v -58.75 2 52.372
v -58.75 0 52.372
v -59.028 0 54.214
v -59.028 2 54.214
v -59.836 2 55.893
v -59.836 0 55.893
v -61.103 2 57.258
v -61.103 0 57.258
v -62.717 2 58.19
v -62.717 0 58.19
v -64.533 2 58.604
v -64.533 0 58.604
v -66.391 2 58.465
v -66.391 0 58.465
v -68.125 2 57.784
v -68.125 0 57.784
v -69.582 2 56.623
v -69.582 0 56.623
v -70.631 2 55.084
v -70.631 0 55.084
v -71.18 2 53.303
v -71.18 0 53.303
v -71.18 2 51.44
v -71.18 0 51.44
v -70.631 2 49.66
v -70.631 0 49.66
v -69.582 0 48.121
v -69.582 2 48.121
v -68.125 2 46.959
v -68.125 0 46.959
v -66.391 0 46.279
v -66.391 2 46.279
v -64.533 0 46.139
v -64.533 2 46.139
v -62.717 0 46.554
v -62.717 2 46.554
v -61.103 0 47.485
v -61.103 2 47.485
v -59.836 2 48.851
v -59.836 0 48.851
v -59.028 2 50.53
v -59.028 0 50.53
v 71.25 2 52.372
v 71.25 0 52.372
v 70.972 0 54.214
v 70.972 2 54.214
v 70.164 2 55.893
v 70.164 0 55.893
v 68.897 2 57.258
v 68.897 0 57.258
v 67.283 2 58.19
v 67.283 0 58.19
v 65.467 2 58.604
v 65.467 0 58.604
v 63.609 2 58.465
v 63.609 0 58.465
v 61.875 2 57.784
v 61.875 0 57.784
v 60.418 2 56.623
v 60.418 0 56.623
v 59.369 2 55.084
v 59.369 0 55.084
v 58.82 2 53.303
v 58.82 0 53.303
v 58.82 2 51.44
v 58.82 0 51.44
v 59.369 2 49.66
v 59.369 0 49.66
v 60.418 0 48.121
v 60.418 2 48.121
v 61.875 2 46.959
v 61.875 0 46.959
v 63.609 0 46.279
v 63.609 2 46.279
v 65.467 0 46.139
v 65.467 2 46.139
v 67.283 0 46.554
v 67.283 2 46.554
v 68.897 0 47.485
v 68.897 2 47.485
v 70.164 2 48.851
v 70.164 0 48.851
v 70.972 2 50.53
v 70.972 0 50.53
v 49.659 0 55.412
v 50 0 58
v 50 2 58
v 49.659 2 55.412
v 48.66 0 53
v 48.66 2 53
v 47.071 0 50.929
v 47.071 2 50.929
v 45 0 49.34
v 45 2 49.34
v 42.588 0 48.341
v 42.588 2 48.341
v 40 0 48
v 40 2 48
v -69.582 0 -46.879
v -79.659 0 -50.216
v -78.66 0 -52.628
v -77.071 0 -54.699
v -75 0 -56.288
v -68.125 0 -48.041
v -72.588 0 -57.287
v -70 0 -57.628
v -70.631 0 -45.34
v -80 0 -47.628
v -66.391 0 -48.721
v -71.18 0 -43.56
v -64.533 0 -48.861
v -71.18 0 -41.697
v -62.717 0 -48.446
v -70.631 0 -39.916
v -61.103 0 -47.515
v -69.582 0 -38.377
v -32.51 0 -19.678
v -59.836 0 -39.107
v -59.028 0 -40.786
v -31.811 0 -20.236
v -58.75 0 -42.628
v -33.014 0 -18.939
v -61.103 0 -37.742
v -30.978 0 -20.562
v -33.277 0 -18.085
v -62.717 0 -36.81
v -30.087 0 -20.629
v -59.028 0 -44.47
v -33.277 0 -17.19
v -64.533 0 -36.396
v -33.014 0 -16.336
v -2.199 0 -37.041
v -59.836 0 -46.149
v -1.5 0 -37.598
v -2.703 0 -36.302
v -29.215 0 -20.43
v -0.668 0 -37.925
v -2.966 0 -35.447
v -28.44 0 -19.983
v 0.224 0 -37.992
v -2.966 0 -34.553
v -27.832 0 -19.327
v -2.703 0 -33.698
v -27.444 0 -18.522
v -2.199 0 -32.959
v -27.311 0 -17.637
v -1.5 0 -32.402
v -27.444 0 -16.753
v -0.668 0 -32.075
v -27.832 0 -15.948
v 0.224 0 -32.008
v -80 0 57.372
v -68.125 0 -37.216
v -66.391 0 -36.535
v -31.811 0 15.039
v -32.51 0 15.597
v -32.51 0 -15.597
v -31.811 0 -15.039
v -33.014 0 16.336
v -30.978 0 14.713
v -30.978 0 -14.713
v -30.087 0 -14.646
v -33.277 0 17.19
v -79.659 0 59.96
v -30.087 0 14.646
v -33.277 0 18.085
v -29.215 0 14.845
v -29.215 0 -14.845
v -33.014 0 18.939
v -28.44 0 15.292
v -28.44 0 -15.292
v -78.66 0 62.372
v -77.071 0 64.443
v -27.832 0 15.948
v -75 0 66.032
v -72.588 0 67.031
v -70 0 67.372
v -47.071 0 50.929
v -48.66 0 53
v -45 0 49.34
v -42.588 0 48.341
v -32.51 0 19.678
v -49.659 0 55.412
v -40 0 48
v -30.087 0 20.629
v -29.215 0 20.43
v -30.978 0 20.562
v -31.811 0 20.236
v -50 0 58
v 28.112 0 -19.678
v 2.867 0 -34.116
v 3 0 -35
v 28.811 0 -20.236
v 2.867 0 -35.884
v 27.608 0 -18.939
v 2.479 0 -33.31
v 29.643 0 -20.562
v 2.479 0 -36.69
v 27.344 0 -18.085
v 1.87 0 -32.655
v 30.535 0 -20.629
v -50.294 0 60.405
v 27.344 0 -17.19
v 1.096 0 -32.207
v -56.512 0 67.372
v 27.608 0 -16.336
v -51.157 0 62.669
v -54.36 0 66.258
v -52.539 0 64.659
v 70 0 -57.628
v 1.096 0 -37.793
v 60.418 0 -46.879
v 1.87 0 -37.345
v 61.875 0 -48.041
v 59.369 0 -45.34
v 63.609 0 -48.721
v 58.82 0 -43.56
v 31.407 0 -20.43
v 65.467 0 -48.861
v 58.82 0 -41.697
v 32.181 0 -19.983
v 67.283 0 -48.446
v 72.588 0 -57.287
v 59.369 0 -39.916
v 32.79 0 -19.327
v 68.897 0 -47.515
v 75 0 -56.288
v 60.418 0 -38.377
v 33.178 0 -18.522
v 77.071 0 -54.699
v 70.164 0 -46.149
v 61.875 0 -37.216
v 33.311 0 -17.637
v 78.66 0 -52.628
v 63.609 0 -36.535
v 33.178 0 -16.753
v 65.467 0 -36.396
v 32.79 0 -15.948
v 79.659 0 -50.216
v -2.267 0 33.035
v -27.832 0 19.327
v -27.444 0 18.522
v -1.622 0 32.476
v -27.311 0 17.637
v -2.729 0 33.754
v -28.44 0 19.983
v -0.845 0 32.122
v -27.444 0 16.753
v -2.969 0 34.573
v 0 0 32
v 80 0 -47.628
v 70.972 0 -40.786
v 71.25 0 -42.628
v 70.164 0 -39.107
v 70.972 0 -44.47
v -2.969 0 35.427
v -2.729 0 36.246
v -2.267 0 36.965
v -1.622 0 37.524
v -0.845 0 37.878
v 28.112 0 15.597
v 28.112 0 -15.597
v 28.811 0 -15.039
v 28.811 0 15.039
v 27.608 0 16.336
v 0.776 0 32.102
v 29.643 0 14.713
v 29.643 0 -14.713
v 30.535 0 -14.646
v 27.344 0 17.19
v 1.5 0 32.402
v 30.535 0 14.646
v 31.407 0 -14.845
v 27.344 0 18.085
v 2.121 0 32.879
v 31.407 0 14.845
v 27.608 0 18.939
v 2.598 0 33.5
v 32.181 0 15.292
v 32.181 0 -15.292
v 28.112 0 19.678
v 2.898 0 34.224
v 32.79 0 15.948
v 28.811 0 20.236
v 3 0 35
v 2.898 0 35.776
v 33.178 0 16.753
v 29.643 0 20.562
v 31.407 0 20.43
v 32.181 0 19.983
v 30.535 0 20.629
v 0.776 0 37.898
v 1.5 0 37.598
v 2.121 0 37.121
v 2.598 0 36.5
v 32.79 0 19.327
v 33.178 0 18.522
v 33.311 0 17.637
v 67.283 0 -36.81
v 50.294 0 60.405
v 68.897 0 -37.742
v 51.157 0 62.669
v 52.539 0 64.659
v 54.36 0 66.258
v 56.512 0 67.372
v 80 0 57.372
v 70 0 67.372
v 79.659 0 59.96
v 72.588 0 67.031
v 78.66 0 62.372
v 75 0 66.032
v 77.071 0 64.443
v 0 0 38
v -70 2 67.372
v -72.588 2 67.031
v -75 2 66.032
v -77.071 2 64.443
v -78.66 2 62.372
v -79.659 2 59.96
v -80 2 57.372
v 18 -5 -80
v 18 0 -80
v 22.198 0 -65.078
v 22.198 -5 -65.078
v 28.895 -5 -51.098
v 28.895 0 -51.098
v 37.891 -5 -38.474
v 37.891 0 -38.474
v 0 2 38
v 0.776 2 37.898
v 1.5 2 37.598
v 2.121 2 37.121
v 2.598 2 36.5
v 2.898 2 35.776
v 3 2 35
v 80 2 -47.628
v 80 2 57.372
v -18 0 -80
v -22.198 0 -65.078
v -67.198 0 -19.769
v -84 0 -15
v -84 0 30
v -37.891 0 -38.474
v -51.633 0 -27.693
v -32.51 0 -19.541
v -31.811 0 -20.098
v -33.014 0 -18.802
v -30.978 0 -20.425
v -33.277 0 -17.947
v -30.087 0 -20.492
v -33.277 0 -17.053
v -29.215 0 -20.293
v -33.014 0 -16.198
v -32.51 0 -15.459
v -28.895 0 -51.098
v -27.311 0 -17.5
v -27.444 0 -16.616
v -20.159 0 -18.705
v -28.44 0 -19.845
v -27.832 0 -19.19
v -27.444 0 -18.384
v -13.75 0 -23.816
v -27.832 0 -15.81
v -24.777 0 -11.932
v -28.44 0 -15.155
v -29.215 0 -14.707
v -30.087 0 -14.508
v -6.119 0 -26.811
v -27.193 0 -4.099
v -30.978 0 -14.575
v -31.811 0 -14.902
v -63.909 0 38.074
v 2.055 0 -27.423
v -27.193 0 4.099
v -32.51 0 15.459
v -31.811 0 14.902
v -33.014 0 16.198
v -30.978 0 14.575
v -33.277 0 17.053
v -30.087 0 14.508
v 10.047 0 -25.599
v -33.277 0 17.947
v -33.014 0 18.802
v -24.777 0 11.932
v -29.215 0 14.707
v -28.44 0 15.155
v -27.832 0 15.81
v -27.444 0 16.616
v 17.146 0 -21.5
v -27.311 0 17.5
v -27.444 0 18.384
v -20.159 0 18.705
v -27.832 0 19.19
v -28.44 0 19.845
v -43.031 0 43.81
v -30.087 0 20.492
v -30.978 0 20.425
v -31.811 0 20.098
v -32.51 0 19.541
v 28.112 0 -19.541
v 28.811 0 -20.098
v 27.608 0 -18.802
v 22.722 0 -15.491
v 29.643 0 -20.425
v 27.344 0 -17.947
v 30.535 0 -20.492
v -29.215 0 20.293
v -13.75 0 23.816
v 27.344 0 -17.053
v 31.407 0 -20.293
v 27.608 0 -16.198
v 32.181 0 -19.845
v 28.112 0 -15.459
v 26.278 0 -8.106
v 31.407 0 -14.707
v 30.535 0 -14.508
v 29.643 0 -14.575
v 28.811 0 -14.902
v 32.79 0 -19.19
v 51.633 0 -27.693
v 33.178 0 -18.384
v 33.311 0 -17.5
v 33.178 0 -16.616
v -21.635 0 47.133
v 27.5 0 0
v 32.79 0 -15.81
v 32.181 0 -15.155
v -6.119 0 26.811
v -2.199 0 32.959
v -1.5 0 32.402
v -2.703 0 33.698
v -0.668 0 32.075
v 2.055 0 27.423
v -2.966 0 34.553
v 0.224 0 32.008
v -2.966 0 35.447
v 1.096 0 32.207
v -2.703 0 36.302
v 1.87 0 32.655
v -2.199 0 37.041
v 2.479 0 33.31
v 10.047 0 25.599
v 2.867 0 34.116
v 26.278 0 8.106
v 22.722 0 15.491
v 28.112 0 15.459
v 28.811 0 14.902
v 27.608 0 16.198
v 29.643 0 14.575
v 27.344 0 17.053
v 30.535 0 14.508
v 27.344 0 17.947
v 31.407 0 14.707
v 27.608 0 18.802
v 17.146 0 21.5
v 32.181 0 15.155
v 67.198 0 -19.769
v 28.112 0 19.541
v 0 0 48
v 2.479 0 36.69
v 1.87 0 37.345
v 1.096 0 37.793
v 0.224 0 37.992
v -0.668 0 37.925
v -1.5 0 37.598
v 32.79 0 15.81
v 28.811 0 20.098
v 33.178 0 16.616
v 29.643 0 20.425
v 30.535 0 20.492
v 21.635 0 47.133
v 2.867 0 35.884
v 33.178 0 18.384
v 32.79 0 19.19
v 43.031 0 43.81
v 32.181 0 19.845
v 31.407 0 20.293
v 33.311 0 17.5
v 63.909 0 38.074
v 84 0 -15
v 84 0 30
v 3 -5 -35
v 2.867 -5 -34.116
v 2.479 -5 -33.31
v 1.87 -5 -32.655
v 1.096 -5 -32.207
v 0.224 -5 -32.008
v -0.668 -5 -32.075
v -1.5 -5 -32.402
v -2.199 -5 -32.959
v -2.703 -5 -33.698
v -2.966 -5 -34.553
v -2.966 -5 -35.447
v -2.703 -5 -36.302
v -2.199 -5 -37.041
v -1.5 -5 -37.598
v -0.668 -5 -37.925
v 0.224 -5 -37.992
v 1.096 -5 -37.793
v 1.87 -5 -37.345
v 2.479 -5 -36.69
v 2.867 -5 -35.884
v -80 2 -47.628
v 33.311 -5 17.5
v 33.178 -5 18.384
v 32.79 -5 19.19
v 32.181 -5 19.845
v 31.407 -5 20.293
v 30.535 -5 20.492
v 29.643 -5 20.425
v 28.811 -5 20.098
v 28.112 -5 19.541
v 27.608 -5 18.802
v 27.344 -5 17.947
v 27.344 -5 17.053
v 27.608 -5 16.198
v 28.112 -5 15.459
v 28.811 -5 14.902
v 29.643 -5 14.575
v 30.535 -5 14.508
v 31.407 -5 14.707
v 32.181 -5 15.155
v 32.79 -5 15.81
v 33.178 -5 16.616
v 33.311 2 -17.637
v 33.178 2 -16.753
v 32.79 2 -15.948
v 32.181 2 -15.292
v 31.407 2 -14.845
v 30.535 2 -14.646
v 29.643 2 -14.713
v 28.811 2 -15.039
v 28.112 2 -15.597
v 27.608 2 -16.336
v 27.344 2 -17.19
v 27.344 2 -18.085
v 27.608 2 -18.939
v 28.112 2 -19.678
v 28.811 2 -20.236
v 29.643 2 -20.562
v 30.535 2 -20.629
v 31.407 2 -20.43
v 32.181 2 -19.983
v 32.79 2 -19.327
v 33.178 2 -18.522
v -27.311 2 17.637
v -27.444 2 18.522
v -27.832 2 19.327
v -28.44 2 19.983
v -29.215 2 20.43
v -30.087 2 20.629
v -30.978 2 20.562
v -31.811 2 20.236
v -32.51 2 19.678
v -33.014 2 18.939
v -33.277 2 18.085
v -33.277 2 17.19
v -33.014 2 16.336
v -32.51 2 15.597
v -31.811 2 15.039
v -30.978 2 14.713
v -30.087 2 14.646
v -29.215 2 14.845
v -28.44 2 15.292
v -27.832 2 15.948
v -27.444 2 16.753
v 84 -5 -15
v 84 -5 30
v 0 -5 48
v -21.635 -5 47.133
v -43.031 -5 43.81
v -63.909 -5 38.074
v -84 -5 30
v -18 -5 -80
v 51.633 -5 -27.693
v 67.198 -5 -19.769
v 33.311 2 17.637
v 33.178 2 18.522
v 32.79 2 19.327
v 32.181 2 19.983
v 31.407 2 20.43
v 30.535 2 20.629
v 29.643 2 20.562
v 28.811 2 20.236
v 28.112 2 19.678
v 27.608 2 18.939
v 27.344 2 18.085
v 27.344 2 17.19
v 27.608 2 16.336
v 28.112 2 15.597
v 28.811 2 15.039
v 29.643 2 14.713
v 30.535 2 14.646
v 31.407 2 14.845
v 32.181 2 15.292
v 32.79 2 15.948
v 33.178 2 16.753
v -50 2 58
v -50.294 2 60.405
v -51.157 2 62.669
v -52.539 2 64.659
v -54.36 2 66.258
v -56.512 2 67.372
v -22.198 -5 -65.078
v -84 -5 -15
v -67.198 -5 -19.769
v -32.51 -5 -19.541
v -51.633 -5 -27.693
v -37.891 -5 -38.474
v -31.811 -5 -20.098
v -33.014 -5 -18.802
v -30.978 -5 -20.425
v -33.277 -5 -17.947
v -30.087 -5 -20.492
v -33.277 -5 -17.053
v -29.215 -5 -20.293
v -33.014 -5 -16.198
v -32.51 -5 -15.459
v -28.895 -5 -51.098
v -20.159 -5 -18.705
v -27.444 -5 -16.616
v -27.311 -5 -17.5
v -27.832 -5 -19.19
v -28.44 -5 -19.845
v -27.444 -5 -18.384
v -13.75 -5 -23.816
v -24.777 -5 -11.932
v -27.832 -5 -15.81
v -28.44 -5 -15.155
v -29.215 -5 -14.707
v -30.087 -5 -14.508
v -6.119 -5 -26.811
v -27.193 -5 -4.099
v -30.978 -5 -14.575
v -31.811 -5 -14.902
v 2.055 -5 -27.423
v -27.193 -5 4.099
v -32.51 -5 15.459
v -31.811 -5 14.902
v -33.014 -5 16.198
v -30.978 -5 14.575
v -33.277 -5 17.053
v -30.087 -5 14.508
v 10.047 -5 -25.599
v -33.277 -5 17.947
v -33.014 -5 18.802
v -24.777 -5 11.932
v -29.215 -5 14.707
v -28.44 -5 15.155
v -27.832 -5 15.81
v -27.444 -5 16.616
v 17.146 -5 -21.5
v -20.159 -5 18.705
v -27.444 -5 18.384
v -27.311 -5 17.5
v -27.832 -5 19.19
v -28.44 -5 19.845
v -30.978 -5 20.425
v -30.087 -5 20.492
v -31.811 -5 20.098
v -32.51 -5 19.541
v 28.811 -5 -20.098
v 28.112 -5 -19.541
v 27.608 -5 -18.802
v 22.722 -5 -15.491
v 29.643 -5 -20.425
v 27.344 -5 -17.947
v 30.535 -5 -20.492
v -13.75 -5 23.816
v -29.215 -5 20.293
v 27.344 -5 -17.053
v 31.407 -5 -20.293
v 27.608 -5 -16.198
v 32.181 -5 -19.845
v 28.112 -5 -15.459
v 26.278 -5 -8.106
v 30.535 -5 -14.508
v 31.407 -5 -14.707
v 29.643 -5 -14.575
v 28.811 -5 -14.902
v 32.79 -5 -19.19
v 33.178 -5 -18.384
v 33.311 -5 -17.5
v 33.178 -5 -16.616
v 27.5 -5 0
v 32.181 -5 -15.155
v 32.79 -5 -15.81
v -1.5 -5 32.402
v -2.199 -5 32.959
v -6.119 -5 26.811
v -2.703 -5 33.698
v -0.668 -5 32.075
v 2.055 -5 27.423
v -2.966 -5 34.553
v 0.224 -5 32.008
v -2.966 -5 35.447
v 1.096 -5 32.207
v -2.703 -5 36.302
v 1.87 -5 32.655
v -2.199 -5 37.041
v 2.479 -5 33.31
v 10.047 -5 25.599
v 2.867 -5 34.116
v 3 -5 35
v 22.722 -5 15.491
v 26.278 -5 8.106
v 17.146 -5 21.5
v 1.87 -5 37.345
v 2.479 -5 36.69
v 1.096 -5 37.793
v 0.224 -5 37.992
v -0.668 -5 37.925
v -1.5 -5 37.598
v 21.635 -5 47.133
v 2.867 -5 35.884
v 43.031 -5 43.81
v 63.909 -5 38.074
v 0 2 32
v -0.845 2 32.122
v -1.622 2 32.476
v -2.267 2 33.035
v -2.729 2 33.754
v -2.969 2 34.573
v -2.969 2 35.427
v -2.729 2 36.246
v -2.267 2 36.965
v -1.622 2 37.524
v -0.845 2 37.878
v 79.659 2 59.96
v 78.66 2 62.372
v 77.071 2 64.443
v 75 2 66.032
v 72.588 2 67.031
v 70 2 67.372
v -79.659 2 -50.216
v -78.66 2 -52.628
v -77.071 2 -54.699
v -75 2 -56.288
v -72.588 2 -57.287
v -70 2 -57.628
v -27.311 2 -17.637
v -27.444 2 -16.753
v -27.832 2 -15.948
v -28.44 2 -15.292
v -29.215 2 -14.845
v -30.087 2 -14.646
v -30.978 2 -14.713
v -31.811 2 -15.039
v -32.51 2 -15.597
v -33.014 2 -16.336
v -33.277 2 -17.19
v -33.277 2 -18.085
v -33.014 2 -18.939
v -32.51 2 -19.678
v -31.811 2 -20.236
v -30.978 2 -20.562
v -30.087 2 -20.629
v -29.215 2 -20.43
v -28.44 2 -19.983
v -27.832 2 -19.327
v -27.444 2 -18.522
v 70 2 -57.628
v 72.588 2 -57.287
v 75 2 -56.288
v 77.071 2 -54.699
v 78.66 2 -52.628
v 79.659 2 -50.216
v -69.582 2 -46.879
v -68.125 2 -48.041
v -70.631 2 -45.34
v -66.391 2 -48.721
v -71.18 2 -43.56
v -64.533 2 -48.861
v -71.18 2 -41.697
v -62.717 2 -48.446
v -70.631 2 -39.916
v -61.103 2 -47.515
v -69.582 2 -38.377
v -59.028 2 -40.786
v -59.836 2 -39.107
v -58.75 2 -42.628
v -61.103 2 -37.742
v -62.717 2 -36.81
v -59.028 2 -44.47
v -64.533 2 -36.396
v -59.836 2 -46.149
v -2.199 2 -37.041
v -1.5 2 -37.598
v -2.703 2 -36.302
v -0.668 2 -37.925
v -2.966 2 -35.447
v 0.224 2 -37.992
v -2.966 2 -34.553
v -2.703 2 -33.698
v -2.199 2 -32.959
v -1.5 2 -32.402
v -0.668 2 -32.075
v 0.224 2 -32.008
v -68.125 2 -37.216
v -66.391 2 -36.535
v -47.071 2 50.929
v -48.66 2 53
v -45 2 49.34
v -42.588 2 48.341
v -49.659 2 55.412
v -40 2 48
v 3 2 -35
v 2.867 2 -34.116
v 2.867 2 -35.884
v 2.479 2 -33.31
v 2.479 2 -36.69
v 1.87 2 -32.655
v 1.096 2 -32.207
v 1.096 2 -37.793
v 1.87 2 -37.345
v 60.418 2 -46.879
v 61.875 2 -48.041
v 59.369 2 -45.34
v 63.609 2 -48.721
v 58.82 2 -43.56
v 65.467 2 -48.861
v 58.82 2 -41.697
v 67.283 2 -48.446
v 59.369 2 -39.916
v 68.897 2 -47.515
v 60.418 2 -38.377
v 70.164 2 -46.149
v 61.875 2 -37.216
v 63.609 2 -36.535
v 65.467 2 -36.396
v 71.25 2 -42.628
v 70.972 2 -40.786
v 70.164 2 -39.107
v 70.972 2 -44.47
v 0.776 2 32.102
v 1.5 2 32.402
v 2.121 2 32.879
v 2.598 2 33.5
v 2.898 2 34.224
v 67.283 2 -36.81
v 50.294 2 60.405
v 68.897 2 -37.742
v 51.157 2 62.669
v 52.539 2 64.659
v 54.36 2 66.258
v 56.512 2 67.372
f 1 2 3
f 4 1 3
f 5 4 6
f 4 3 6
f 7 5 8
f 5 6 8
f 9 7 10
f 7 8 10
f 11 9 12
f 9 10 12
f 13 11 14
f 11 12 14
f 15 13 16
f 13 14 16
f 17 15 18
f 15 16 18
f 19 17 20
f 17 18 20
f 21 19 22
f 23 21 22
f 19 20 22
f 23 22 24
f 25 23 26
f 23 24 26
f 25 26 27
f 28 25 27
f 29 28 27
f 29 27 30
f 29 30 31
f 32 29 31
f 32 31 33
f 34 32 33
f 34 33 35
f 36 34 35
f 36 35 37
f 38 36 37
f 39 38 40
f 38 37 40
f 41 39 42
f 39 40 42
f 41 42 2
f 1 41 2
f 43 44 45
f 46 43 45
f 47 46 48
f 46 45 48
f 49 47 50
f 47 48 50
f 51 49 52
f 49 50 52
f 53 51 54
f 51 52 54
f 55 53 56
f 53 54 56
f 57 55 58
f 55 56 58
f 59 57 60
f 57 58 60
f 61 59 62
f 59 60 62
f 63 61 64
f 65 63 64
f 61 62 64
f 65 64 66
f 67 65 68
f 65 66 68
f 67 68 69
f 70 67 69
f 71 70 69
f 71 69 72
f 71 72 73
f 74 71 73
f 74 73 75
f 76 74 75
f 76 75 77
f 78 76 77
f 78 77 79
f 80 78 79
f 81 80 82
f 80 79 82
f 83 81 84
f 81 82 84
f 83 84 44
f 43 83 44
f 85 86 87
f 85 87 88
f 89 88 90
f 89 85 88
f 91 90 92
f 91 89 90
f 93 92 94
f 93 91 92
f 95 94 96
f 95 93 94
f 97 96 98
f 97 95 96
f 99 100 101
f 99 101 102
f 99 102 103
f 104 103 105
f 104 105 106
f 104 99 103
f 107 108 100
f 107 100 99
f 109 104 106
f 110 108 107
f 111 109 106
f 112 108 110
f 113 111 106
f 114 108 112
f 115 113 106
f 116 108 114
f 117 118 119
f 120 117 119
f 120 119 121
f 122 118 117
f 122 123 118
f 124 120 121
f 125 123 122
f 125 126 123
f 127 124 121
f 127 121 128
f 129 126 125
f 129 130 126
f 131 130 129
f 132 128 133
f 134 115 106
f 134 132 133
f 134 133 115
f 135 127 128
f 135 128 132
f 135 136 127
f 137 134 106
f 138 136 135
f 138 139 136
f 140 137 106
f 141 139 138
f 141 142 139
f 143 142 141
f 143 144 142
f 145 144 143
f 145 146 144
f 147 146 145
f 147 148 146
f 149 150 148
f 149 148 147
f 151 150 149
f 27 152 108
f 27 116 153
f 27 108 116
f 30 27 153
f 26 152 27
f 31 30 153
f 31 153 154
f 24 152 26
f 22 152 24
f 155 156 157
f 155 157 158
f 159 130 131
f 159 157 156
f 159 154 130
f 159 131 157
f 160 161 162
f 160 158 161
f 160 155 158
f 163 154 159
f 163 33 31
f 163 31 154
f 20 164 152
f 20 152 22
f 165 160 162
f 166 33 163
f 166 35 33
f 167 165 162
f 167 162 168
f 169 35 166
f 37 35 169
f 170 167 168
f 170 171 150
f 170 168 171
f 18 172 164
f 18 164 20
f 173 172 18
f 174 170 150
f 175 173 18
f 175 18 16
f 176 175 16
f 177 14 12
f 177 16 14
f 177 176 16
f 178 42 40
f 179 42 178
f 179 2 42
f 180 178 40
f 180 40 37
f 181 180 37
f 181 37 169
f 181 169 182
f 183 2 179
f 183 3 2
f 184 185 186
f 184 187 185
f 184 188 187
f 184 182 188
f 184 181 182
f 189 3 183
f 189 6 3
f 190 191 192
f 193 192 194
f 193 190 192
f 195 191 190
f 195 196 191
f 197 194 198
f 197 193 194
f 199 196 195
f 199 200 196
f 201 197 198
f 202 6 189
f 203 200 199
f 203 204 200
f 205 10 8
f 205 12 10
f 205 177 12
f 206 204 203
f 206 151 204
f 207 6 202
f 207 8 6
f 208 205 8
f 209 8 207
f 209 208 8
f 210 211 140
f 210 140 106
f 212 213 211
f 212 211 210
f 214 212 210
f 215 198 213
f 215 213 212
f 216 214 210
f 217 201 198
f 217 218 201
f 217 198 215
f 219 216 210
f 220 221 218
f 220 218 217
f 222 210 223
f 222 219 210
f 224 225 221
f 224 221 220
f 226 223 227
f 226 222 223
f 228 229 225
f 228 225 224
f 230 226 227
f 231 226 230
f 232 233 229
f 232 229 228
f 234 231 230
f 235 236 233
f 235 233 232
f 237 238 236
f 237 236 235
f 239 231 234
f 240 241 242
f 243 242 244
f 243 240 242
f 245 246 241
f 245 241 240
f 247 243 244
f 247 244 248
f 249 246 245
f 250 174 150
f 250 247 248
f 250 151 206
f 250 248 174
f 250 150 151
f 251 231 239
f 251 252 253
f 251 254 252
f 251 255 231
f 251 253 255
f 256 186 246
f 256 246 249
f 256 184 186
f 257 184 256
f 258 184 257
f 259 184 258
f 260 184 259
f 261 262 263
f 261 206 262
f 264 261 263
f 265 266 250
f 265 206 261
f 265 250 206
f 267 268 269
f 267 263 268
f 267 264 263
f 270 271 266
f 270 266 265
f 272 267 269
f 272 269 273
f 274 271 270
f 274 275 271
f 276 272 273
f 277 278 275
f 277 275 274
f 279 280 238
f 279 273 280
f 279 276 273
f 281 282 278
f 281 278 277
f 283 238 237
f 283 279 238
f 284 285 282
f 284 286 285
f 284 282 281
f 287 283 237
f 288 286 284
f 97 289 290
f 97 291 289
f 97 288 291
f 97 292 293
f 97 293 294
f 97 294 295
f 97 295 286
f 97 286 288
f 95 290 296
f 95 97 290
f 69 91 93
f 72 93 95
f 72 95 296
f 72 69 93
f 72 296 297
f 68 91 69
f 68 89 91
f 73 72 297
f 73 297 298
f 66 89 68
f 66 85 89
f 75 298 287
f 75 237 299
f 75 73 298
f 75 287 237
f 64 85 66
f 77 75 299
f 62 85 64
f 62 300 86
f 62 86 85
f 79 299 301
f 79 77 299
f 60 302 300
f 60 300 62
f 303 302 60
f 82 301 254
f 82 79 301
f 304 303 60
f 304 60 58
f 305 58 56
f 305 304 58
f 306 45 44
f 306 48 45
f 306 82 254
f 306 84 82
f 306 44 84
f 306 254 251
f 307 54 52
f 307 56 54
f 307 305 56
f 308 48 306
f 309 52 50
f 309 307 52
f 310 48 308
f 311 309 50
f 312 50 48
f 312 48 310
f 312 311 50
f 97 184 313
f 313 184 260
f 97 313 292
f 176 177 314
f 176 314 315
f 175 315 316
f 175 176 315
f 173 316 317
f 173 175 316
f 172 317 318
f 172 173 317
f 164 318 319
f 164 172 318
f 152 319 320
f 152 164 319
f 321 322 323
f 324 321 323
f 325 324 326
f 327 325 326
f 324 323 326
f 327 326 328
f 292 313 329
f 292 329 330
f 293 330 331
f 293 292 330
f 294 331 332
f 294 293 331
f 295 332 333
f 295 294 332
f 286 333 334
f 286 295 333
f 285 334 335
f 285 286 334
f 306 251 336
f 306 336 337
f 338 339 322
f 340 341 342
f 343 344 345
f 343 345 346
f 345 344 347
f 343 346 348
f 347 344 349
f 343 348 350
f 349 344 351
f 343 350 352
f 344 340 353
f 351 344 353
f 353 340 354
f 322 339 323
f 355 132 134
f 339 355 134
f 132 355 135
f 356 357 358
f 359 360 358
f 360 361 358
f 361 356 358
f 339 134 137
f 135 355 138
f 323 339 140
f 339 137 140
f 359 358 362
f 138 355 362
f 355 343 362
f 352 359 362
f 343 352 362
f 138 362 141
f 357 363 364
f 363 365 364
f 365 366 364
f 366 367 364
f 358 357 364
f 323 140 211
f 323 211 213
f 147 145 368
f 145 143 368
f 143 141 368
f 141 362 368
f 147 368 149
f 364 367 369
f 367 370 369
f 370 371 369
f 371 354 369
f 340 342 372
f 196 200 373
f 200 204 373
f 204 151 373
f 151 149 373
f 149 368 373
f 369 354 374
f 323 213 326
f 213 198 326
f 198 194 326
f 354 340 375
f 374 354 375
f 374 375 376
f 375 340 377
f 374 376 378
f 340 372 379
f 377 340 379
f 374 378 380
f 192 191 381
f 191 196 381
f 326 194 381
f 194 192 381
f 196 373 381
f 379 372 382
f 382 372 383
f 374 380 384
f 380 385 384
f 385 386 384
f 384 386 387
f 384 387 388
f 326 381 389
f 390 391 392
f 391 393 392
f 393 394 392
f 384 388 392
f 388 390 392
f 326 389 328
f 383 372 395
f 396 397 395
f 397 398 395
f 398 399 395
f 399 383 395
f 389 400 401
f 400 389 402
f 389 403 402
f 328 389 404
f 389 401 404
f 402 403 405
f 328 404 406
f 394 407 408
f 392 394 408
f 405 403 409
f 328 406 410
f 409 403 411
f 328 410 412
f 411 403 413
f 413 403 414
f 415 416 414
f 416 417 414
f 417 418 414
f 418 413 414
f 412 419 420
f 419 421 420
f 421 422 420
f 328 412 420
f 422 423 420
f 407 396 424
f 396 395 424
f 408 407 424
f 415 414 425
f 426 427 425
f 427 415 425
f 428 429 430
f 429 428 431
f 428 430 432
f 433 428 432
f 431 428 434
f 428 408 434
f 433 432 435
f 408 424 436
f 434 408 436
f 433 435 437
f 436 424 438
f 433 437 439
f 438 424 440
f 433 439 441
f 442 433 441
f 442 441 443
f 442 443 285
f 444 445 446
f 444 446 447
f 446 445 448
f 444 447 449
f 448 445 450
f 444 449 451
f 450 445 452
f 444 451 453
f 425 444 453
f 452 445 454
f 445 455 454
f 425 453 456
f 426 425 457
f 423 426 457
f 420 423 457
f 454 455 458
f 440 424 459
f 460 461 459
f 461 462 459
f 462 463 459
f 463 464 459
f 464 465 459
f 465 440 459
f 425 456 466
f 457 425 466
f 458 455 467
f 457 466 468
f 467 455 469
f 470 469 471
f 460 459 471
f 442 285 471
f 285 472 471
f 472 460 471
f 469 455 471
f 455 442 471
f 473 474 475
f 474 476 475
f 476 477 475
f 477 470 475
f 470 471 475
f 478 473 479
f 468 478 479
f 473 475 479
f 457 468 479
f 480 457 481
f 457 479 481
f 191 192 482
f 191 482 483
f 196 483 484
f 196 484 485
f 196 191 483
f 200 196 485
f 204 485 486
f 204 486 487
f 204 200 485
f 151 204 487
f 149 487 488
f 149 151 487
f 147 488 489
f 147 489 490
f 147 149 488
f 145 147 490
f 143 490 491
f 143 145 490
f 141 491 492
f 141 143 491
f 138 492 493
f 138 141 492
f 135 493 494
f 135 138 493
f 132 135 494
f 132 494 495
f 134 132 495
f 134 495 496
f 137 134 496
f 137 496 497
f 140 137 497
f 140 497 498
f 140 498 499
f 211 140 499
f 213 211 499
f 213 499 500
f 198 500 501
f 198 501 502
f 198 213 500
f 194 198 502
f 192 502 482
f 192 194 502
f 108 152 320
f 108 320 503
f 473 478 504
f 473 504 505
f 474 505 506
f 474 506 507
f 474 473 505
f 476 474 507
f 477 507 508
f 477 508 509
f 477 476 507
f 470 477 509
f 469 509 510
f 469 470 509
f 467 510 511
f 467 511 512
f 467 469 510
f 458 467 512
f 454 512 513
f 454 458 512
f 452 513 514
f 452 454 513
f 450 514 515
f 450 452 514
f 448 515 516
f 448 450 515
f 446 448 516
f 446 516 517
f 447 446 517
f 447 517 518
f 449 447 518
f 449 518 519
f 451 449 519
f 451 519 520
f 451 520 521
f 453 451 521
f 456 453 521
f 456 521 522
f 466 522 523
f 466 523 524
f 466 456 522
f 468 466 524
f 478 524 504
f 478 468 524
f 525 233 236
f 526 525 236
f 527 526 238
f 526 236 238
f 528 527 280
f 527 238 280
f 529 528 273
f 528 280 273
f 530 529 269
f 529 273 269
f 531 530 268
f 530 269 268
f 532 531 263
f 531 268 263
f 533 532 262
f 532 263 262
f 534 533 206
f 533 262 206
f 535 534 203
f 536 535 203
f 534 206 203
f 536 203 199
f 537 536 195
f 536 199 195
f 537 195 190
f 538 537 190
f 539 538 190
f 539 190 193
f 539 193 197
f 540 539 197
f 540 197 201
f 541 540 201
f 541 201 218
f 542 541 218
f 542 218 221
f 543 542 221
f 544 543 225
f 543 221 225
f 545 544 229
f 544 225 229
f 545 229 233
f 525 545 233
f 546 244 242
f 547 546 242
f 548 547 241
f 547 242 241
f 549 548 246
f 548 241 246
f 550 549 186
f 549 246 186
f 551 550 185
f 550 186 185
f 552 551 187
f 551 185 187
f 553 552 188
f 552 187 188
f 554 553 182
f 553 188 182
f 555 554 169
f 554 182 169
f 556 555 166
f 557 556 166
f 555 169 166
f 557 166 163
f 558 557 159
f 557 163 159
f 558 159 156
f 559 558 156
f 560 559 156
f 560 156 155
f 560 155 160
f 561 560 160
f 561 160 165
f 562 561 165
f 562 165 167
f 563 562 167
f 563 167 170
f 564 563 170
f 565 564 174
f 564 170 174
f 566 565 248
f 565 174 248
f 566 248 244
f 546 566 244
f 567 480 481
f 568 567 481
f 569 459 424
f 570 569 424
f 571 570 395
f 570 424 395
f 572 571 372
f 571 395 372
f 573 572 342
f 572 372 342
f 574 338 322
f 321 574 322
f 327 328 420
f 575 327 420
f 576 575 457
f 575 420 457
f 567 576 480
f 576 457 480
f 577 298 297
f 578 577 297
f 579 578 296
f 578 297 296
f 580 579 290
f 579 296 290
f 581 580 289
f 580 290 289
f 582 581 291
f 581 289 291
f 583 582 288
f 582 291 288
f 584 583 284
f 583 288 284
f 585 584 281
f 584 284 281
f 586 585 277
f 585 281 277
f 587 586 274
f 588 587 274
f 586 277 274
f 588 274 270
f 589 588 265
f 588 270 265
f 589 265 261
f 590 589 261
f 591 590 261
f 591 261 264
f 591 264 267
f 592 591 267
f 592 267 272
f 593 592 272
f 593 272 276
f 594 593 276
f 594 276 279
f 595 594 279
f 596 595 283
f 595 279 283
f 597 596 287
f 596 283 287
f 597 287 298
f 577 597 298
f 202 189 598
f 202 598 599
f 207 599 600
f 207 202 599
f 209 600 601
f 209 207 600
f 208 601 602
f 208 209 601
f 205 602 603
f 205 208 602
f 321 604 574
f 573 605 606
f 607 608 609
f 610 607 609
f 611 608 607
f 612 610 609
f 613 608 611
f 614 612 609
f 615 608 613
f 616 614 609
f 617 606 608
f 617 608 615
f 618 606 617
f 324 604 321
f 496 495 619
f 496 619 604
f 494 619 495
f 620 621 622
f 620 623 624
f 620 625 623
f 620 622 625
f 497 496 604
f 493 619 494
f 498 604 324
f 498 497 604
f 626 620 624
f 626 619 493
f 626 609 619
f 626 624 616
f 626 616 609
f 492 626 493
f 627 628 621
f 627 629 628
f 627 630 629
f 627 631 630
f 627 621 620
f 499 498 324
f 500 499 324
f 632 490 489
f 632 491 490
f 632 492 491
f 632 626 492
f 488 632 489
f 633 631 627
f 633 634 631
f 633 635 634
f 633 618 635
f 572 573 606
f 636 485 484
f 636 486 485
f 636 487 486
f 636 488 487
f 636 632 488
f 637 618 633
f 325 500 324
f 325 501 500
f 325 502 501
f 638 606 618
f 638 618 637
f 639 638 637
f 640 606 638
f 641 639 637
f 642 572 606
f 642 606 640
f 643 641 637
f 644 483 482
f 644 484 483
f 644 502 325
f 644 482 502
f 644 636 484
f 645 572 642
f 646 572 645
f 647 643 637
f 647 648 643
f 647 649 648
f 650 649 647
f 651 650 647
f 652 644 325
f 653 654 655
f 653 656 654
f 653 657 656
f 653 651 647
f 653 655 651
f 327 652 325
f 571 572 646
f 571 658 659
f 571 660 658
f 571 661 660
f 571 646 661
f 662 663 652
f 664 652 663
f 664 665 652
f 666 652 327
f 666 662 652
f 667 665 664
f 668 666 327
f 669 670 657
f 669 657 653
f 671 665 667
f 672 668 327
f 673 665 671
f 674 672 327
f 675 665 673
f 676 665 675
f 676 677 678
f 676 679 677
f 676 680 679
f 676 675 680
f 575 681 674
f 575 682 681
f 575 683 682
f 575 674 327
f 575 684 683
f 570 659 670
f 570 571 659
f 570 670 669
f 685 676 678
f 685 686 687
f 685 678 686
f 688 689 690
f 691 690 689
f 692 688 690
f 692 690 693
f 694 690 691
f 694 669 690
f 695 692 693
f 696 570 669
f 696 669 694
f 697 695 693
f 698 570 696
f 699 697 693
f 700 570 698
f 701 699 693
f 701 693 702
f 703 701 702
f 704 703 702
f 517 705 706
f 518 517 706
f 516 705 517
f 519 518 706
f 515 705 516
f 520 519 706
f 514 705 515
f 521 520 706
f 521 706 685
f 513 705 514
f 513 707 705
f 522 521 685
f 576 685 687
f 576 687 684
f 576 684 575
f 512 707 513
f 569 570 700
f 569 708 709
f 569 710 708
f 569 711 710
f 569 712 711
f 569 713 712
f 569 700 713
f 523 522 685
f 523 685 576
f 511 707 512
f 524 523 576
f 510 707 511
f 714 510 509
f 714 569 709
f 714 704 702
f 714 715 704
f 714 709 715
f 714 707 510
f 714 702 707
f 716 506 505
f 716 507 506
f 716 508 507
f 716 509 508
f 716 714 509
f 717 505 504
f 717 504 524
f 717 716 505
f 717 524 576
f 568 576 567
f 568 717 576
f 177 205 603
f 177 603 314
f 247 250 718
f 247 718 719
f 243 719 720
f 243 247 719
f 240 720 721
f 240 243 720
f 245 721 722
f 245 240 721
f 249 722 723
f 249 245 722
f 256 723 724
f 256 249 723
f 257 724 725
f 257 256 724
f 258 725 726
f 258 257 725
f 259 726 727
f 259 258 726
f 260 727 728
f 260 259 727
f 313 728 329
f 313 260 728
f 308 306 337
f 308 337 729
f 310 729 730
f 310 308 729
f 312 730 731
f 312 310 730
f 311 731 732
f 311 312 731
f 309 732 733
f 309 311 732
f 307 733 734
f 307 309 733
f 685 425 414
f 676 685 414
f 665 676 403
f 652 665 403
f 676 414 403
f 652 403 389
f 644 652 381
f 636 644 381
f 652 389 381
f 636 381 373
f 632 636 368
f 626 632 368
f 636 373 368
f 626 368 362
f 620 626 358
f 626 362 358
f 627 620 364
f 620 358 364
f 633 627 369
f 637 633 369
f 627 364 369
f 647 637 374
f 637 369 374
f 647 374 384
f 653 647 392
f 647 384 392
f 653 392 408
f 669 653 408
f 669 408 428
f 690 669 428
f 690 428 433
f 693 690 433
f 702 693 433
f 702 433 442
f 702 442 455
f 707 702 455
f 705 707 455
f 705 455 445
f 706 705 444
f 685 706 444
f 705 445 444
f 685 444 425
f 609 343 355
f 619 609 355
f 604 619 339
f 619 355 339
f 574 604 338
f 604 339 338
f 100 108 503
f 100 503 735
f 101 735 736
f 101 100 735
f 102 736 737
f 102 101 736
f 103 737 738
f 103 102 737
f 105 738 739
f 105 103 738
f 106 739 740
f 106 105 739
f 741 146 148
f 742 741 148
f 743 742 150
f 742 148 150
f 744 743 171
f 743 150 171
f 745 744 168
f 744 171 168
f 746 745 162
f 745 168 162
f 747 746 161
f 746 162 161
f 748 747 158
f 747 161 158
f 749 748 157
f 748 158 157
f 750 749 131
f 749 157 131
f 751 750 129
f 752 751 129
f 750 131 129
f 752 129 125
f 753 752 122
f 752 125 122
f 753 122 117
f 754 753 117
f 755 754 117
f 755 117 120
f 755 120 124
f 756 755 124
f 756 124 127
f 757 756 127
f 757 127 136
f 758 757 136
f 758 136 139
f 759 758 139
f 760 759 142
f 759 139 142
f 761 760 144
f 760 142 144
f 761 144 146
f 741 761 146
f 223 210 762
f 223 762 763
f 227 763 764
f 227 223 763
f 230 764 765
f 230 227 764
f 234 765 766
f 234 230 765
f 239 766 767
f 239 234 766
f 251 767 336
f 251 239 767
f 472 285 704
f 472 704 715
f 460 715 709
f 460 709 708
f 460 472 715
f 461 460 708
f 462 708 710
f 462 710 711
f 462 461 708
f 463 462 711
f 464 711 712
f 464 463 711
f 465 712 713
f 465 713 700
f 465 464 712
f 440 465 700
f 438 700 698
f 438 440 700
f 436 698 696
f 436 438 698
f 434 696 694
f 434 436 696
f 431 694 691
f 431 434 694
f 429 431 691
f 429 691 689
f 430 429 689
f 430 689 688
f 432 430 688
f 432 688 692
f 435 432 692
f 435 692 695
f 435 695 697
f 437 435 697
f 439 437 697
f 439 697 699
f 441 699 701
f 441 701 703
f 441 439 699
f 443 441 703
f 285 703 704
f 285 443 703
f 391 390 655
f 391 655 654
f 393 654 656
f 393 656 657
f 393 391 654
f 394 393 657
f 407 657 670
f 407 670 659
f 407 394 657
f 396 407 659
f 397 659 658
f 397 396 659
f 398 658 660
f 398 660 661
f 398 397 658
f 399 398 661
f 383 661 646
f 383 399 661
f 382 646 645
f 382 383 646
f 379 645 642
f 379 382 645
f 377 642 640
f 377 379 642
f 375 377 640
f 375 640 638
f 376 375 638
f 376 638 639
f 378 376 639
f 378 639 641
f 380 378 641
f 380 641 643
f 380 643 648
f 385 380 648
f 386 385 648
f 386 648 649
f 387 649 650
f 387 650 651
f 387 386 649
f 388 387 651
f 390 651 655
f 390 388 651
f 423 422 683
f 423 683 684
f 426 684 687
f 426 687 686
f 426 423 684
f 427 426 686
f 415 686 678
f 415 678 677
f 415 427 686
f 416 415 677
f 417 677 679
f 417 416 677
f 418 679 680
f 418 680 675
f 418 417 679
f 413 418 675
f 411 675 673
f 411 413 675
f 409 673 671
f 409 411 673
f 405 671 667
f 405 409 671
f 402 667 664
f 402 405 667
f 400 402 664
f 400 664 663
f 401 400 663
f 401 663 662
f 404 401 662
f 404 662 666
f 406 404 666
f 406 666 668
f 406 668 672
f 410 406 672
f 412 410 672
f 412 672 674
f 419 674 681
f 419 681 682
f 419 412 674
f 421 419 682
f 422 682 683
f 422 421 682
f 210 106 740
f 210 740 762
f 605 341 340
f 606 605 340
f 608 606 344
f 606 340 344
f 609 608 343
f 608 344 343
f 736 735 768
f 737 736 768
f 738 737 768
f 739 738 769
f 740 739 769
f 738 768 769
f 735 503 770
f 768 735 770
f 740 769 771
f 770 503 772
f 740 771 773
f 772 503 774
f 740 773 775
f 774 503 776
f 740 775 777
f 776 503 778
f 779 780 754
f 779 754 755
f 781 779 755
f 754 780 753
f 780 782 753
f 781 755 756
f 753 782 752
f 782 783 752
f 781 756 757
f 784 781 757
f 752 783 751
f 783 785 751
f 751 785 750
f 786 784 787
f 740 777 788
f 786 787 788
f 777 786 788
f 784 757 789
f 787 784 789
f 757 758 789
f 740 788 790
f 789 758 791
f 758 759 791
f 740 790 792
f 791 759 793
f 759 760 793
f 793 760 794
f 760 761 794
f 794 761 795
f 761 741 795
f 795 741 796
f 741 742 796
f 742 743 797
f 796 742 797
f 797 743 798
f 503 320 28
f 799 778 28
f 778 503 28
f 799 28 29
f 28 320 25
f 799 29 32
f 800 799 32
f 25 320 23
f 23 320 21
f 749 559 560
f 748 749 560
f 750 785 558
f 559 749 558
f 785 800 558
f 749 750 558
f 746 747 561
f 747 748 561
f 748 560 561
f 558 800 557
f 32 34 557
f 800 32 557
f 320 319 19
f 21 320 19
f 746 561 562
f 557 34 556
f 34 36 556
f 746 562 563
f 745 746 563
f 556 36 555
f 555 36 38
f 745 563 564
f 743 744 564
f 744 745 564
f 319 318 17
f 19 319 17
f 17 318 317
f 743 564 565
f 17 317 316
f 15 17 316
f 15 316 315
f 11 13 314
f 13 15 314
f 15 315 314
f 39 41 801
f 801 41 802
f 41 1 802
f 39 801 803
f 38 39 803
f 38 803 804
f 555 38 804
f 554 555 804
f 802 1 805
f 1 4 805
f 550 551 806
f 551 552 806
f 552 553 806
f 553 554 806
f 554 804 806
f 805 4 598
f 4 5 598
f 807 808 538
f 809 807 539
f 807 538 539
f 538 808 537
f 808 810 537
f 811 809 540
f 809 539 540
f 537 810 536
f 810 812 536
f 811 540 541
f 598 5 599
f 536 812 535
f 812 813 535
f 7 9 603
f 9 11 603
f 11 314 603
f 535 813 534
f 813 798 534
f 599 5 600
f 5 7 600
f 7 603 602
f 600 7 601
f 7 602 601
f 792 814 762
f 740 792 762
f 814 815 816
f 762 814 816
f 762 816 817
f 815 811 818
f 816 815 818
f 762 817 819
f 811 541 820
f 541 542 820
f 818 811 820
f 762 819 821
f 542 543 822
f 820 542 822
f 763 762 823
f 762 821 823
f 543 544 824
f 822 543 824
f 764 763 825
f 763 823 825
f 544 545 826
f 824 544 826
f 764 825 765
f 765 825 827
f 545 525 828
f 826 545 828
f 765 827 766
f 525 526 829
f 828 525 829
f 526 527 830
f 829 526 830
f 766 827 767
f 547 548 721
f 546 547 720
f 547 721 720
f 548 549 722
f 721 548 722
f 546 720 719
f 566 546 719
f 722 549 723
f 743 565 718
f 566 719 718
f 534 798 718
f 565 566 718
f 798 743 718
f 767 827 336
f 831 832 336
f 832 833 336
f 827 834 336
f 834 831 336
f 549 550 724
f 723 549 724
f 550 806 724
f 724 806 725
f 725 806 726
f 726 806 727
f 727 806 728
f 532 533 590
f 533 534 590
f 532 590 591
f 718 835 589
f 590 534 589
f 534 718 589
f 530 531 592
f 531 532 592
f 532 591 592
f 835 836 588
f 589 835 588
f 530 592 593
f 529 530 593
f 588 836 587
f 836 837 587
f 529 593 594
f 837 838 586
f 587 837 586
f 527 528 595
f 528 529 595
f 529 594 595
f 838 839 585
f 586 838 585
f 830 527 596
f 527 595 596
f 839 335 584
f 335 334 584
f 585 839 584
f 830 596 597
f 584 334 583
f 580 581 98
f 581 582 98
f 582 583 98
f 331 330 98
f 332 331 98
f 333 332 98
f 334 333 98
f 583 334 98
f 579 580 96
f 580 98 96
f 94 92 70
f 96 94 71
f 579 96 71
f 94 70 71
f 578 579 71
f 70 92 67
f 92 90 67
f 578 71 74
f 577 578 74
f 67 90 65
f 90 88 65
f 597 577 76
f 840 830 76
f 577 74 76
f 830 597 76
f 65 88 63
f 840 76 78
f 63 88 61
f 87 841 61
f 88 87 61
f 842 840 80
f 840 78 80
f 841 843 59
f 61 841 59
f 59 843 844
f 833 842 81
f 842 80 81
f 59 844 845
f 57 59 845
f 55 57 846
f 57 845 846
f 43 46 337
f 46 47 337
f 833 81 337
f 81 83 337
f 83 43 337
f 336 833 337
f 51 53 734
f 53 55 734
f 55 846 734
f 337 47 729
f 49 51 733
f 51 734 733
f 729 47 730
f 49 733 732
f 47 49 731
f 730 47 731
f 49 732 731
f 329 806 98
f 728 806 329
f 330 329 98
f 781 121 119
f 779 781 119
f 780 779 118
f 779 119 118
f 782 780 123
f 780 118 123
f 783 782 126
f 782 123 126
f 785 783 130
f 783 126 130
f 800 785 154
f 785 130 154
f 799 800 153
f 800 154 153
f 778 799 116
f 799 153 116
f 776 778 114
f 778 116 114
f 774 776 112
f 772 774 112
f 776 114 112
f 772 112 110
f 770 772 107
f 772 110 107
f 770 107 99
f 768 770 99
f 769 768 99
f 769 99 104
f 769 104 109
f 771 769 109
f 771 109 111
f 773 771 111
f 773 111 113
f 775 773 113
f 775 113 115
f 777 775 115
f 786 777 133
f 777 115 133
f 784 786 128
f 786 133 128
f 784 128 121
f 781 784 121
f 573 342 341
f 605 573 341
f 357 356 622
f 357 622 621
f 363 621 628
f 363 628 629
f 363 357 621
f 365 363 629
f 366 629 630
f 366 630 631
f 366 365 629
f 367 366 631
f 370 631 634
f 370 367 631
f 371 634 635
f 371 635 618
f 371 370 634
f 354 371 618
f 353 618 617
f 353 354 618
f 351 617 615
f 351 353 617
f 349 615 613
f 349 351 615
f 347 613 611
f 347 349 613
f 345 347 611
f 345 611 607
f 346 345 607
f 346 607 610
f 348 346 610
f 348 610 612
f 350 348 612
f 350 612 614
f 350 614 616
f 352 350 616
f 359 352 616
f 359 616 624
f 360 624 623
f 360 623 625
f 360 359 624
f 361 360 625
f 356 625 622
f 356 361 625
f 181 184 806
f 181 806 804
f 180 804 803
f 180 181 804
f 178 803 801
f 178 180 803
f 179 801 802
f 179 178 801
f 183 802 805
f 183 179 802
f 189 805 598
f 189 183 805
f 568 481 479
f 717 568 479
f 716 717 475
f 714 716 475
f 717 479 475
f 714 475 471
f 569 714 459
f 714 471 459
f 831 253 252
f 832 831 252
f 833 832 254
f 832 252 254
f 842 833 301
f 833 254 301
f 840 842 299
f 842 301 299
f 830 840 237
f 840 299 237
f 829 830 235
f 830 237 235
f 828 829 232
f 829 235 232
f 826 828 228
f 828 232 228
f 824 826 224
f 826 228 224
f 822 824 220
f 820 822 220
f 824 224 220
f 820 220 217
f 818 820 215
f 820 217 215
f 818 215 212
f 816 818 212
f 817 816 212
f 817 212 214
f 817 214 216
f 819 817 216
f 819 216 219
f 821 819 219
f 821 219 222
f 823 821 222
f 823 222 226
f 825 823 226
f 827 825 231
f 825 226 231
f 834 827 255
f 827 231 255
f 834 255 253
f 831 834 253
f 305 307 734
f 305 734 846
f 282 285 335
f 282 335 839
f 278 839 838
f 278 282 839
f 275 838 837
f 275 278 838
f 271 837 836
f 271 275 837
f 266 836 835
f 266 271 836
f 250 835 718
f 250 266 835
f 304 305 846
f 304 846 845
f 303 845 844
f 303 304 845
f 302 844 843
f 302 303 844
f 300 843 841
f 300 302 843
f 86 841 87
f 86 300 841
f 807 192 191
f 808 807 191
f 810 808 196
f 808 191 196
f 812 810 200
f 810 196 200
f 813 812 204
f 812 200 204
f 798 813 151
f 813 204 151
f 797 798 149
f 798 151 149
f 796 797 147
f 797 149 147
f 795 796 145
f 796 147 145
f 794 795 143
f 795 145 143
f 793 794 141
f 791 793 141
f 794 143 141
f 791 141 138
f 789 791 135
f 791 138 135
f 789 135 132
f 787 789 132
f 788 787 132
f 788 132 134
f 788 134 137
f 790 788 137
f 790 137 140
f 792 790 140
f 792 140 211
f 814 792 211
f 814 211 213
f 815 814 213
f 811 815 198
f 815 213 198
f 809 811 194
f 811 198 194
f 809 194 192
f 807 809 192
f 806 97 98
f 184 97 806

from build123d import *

# Parameters (mm, degrees)
F0_R     = 3
F1_DEPTH = 5
F2_R     = 6.25
F2_R_2   = 3
F3_DEPTH = 2


# Not quite as in the source:
# - a feature names something its author has since deleted; it is built from what else it names


with BuildPart() as f1:
    # F0 (on Front) → F1 (new body)
    with BuildSketch(Plane.XZ):
        with BuildLine():
            ThreePointArc((18, -80), (25.2450835608, -57.9435000854), (37.8911830779, -38.474124356))
            ThreePointArc((37.8911830779, -38.474124356), (59.2223421632, -23.3521866114), (84, -15))
            Line((84, -15), (84, 30))
            ThreePointArc((84, 30), (43.0306603199, 43.8097481595), (0, 48))
            ThreePointArc((0, 48), (-43.0306603199, 43.8097481595), (-84, 30))
            Line((-84, 30), (-84, -15))
            ThreePointArc((-84, -15), (-59.2223421632, -23.3521866114), (-37.8911830779, -38.474124356))
            ThreePointArc((-37.8911830779, -38.474124356), (-25.2450835608, -57.9435000854), (-18, -80))
            Line((-18, -80), (0, -80))
            Line((0, -80), (18, -80))
        make_face()
        with Locations((-30.3108891325, -17.5)):
            Circle(F0_R, mode=Mode.SUBTRACT)
        with Locations((0, -35)):
            Circle(F0_R, mode=Mode.SUBTRACT)
        with Locations((30.3108891325, -17.5)):
            Circle(F0_R, mode=Mode.SUBTRACT)
        with Locations((-30.3108891325, 17.5)):
            Circle(F0_R, mode=Mode.SUBTRACT)
        with BuildLine():
            ThreePointArc((19.2964358267, -19.5933040702), (-25.3663358138, 10.6206877076), (27.5, 0))
            ThreePointArc((27.5, 0), (25.3663358138, -10.6206877076), (19.2964358267, -19.5933040702))
        make_face(mode=Mode.SUBTRACT)
        with Locations((30.3108891325, 17.5)):
            Circle(F0_R, mode=Mode.SUBTRACT)
        with Locations((0, 35)):
            Circle(F0_R, mode=Mode.SUBTRACT)
    extrude(amount=F1_DEPTH)


with BuildPart() as f3:
    # F2 (on Front) → F3 (new body)
    with BuildSketch(Plane.XZ):
        with BuildLine():
            ThreePointArc((-40, 48), (-47.0710678119, 50.9289321881), (-50, 58))
            ThreePointArc((-50, 58), (-51.7877055527, 63.7059810647), (-56.5116439822, 67.3718393228))
            Line((-56.5116439822, 67.3718393228), (-70, 67.3718393228))
            ThreePointArc((-70, 67.3718393228), (-77.0710678119, 64.4429071347), (-80, 57.3718393228))
            Line((-80, 57.3718393228), (-80, -47.6281606772))
            ThreePointArc((-80, -47.6281606772), (-77.0710678119, -54.699228489), (-70, -57.6281606772))
            Line((-70, -57.6281606772), (0, -57.6281606772))
            Line((0, -57.6281606772), (70, -57.6281606772))
            ThreePointArc((70, -57.6281606772), (77.0710678119, -54.699228489), (80, -47.6281606772))
            Line((80, -47.6281606772), (80, 57.3718393228))
            ThreePointArc((80, 57.3718393228), (77.0710678119, 64.4429071347), (70, 67.3718393228))
            Line((70, 67.3718393228), (56.5116439822, 67.3718393228))
            ThreePointArc((56.5116439822, 67.3718393228), (51.7877055527, 63.7059810647), (50, 58))
            ThreePointArc((50, 58), (47.0710678119, 50.9289321881), (40, 48))
            Line((40, 48), (0, 48))
            Line((0, 48), (-40, 48))
        make_face()
        with Locations((-65, -42.6281606772)):
            Circle(F2_R, mode=Mode.SUBTRACT)
        with Locations((-30.3108891325, -17.6374954636)):
            Circle(F2_R_2, mode=Mode.SUBTRACT)
        with Locations((0, -35)):
            Circle(F2_R_2, mode=Mode.SUBTRACT)
        with Locations((65, -42.6281606772)):
            Circle(F2_R, mode=Mode.SUBTRACT)
        with Locations((30.3108891325, -17.6374954636)):
            Circle(F2_R_2, mode=Mode.SUBTRACT)
        with Locations((-30.3108891325, 17.6374954636)):
            Circle(F2_R_2, mode=Mode.SUBTRACT)
        with Locations((-65, 52.3718393228)):
            Circle(F2_R, mode=Mode.SUBTRACT)
        with Locations((30.3108891325, 17.6374954636)):
            Circle(F2_R_2, mode=Mode.SUBTRACT)
        with BuildLine():
            ThreePointArc((0, 32), (-3, 35), (0, 38))
            ThreePointArc((0, 38), (2.1213203436, 37.1213203436), (3, 35))
            ThreePointArc((3, 35), (2.1213203436, 32.8786796564), (0, 32))
        make_face(mode=Mode.SUBTRACT)
        with Locations((65, 52.3718393228)):
            Circle(F2_R, mode=Mode.SUBTRACT)
    extrude(amount=-F3_DEPTH)


solid = Compound([f1.part, f3.part])
